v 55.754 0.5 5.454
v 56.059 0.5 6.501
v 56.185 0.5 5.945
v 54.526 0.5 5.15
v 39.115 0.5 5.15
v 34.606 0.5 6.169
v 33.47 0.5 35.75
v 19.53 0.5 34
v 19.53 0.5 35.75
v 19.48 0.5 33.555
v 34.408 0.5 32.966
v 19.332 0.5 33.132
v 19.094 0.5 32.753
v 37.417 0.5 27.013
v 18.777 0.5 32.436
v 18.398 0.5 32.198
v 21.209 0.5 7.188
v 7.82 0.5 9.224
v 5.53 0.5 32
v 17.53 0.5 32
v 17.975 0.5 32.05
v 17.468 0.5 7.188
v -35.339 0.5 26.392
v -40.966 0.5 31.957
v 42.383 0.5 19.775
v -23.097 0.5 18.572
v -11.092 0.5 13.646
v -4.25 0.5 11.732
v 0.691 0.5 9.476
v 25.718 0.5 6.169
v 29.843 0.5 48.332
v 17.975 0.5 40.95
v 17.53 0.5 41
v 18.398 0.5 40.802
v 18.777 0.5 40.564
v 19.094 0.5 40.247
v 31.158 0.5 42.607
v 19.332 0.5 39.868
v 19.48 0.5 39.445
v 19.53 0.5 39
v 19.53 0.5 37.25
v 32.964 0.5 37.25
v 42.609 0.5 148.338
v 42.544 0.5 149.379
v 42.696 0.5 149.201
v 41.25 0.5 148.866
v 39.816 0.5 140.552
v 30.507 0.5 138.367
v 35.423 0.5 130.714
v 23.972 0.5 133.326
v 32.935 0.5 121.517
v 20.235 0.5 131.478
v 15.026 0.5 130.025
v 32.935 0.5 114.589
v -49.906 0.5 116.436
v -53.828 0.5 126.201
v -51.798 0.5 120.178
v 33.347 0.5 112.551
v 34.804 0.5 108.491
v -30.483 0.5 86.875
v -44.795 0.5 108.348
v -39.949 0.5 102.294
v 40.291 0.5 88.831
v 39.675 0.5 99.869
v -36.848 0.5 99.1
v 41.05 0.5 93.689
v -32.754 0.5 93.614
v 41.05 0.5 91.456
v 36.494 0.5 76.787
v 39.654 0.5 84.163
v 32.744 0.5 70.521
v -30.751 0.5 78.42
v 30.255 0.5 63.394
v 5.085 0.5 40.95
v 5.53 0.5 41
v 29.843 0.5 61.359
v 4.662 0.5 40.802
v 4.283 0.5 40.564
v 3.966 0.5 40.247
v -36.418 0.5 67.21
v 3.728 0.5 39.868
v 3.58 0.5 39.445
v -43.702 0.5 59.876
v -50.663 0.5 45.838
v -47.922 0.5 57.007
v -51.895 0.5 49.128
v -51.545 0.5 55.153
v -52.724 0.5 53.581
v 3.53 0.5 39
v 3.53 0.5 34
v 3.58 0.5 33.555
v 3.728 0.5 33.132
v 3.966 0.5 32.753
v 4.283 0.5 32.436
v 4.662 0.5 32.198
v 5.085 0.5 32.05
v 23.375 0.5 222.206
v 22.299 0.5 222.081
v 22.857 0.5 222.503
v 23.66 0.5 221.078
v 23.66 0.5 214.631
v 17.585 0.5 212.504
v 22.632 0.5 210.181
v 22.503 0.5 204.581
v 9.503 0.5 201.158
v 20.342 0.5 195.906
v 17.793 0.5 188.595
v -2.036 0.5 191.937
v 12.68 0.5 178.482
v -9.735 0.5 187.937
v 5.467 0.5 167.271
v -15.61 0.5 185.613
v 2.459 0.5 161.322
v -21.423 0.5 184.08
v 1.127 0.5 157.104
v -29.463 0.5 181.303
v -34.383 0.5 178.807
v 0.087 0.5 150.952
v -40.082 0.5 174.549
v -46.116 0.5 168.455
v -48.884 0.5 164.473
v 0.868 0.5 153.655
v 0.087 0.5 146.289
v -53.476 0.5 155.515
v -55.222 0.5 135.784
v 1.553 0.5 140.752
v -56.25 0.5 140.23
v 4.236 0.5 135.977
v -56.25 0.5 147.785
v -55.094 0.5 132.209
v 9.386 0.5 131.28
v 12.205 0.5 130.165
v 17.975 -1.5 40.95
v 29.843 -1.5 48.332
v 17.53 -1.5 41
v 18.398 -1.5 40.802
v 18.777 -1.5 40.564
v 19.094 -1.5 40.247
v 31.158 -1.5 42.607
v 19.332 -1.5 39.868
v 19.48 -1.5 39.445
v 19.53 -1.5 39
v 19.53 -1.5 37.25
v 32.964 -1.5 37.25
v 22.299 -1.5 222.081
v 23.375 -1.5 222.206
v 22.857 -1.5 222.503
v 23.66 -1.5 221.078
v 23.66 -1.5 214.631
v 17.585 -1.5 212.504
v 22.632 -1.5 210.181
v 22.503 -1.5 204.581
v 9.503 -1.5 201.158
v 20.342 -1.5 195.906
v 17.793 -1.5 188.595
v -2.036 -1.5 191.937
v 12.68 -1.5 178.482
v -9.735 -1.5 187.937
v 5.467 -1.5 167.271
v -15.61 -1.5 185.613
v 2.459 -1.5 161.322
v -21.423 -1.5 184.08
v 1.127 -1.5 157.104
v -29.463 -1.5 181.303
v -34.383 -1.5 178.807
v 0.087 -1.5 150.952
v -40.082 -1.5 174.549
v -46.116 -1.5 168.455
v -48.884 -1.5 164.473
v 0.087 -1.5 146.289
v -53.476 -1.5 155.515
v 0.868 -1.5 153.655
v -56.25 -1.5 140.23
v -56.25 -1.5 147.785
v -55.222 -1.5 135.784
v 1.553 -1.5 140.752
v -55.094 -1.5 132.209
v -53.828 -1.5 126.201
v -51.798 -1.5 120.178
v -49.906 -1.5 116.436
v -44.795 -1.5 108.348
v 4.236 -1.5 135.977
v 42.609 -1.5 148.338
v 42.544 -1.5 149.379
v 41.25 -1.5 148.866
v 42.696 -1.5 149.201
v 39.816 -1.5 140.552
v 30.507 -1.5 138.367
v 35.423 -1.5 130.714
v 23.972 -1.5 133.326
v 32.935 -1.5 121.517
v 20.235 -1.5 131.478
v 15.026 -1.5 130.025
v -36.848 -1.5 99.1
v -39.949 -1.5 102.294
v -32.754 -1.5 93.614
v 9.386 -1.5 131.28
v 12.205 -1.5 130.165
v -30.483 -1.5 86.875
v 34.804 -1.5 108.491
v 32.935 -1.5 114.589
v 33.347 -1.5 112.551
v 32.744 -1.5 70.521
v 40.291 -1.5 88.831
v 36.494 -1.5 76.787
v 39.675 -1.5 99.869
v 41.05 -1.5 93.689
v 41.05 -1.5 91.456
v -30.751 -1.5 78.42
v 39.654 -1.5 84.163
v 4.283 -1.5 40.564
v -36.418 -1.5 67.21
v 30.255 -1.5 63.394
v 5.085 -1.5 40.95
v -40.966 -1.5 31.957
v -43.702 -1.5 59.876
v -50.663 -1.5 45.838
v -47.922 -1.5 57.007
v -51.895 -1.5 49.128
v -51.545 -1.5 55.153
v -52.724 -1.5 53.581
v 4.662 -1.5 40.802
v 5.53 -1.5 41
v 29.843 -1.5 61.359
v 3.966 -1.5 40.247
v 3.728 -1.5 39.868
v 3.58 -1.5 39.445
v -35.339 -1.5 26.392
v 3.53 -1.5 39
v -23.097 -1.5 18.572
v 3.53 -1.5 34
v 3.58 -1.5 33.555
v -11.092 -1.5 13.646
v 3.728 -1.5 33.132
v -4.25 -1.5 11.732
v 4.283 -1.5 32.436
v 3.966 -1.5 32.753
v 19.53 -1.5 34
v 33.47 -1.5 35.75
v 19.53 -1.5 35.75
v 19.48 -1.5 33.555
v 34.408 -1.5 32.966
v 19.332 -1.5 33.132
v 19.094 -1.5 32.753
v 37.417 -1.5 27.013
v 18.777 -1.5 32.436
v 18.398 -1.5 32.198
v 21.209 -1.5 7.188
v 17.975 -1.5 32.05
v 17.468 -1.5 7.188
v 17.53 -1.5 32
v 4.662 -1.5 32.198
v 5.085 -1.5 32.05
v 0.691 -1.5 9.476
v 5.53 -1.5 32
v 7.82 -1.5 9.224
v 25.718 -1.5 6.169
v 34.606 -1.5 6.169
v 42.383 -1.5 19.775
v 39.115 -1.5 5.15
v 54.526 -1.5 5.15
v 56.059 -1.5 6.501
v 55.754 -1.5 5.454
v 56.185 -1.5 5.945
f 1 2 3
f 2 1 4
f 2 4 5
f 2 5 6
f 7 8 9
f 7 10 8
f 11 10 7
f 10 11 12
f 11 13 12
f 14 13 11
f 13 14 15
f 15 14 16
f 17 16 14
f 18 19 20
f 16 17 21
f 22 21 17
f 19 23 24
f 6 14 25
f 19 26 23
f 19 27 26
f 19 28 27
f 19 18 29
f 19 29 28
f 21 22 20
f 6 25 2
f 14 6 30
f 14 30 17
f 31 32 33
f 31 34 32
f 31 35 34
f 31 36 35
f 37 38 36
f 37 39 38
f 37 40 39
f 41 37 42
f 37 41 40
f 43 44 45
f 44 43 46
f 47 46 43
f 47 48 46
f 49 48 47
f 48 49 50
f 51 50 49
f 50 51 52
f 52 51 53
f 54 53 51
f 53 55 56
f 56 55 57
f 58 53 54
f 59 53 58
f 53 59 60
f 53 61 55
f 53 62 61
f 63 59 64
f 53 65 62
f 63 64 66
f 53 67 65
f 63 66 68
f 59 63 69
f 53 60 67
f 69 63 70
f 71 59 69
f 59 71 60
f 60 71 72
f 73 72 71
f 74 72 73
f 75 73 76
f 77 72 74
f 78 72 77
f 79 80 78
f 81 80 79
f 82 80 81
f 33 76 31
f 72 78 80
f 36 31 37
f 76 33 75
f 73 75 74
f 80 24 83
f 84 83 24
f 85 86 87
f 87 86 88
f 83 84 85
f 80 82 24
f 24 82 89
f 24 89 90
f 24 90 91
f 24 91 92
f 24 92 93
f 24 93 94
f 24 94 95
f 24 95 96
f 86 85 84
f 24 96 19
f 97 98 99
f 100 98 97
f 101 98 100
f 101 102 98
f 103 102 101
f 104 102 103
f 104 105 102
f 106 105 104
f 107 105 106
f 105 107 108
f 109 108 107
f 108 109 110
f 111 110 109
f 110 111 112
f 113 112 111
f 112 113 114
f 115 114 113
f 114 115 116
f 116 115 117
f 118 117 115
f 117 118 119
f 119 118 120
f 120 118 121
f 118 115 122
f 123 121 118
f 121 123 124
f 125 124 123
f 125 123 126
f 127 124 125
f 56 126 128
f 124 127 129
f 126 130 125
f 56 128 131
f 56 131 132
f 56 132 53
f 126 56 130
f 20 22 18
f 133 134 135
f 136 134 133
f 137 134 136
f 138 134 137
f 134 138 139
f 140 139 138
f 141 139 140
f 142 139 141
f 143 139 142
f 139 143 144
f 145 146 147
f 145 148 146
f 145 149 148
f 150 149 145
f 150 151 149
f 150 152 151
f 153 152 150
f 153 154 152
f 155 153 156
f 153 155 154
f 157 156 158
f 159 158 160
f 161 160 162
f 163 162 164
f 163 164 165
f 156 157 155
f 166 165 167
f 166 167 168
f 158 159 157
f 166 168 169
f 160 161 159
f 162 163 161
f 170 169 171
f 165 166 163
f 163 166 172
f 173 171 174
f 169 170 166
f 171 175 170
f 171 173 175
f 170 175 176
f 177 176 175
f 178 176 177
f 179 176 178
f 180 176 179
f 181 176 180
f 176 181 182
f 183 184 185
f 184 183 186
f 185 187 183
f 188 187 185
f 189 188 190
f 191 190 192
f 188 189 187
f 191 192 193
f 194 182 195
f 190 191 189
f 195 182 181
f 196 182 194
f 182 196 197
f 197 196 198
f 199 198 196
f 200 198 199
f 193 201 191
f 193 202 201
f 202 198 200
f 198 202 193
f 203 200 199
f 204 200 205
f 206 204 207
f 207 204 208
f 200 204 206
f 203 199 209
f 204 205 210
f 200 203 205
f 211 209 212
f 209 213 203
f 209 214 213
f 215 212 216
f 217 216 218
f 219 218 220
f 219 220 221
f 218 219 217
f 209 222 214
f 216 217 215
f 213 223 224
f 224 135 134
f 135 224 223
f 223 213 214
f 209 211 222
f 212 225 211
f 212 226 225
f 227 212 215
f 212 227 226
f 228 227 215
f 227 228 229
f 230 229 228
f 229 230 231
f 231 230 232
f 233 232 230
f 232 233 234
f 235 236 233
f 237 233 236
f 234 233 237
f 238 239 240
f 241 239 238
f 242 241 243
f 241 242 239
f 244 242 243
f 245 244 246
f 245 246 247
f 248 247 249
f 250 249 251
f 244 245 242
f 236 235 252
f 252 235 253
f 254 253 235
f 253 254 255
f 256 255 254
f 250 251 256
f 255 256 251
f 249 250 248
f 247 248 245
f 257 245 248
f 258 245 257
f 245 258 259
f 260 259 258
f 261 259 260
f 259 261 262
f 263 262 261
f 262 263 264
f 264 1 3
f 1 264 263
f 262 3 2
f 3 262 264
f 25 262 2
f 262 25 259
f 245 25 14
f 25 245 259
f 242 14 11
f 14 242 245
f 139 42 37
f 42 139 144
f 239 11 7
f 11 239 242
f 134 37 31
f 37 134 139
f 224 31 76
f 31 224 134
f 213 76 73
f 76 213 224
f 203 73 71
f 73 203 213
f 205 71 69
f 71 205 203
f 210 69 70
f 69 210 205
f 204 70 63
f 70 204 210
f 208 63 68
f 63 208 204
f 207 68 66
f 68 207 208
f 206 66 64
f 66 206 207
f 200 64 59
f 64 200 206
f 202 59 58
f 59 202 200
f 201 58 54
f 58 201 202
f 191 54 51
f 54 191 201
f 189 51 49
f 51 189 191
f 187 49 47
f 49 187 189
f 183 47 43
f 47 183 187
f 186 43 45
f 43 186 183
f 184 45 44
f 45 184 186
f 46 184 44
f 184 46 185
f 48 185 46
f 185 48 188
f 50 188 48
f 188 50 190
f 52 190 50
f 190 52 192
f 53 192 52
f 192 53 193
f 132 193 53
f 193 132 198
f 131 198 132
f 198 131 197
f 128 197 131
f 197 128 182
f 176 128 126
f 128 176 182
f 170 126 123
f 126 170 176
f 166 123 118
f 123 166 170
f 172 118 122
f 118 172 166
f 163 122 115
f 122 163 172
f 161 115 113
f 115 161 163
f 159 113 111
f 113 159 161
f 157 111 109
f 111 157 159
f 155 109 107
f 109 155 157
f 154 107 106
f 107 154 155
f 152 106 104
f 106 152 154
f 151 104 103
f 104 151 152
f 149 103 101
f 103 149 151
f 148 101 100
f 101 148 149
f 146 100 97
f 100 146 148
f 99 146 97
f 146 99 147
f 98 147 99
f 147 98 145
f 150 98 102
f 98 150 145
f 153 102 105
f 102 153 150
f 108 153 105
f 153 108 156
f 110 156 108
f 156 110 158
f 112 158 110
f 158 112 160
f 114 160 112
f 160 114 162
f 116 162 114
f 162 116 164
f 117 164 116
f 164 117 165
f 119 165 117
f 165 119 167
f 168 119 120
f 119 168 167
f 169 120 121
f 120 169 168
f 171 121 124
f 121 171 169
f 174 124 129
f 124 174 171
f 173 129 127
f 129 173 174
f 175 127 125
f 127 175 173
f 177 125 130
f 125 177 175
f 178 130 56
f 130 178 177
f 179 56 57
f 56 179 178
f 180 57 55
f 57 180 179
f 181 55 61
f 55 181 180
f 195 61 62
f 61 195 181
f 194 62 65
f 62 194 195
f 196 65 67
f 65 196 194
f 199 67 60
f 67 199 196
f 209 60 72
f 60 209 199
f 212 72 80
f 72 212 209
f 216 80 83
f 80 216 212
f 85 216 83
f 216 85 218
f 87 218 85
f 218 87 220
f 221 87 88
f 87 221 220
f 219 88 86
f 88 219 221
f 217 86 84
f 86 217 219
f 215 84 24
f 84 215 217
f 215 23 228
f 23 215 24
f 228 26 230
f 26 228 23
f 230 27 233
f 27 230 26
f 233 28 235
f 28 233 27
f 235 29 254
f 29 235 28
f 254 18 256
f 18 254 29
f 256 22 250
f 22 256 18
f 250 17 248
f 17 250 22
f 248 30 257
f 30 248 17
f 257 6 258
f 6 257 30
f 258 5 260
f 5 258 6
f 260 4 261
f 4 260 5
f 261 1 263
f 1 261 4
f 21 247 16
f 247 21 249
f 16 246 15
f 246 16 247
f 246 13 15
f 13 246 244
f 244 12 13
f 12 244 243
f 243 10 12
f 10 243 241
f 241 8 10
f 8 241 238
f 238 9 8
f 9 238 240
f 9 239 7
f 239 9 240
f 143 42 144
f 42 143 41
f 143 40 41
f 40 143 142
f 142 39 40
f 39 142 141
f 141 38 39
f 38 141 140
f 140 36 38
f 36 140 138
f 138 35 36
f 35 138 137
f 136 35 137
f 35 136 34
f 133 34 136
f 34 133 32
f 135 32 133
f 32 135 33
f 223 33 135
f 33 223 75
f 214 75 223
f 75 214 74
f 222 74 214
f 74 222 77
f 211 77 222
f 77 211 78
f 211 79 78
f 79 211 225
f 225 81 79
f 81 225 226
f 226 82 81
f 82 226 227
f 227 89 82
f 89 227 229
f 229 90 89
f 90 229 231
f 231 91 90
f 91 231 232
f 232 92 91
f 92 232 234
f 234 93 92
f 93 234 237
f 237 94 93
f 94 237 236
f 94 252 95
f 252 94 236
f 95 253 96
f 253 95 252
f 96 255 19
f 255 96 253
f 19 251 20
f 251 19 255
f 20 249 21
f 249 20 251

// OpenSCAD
// file: shape_pts.scad
// Left Flame (FL) traced from images/generate_an_image_of_this.png via octolamp-lamp-base.
// Exterior housing: 120.00 x 225.00 mm (114.00 x 219.00 mm interior cavity + 3.00 mm Octolamp wall).
// Matches the 1.5x flame-to-letter height proportion next to the 100 x 150 mm Engenesis letters.

shape_w = 114.00;
shape_h = 219.00;
rec_chip_x = 12.00;
rec_chip_z = 62.00;
rec_cable_x = 12.00;
rec_ziptie_z = 33.50;
rec_keyhole_z = 19.50;
rec_slit_dir = 1;
rec_snap_top_x = 14.50;
rec_snap_top_z = 126.40;
rec_snap_bot_x = 42.00;
rec_clip_x = 38.00;
rec_pillars = [[-18.0, 88.0], [-12.0, 44.0], [-26.0, 128.0], [-12.0, 164.0]];

shape_pts = [[56.742,2.484],[42.959,15.861],[38.064,22.996],[35.102,28.856],[31.881,38.411],[30.593,44.017],[30.593,56.884],[30.980,58.795],[33.427,65.802],[37.163,72.045],[40.383,79.561],[41.027,84.275],[41.800,86.950],[41.800,89.371],[40.383,95.741],[35.488,104.404],[34.071,108.353],[33.685,110.264],[33.685,117.017],[36.132,126.062],[40.512,135.872],[43.346,143.771],[43.475,145.045],[42.766,145.873],[40.834,145.108],[30.014,134.534],[23.573,129.565],[19.966,127.782],[14.942,126.380],[12.366,126.508],[9.790,127.527],[4.831,132.050],[2.254,136.636],[0.837,141.987],[0.837,146.446],[1.610,149.121],[1.868,152.561],[3.156,156.638],[6.119,162.498],[13.332,173.709],[18.485,183.901],[21.061,191.291],[23.251,200.081],[23.380,205.687],[24.410,210.146],[24.410,216.771],[24.024,218.299],[22.800,219.000],[21.705,218.172],[16.939,208.490],[8.953,197.278],[-2.447,188.169],[-10.047,184.220],[-15.844,181.927],[-21.641,180.398],[-29.756,177.595],[-34.780,175.047],[-40.576,170.716],[-46.695,164.537],[-49.529,160.460],[-54.166,151.414],[-57.000,143.516],[-57.000,135.744],[-55.969,131.285],[-55.841,127.718],[-54.553,121.603],[-52.492,115.488],[-50.559,111.666],[-45.407,103.512],[-40.512,97.397],[-37.420,94.212],[-33.427,88.861],[-31.237,82.364],[-31.495,74.210],[-37.034,63.254],[-44.183,56.056],[-48.305,53.253],[-52.041,51.342],[-53.522,49.367],[-52.620,44.526],[-51.332,41.086],[-41.542,27.072],[-35.810,21.403],[-23.444,13.504],[-11.336,8.536],[-4.508,6.625],[0.515,4.332],[7.729,4.077],[17.390,2.038],[21.125,2.038],[25.634,1.019],[34.522,1.019],[39.031,0.000],[54.617,0.000],[56.163,0.382],[57.000,1.338]];
shape_paths = [[0, 1, 2, 3, 4, 5, 6, 7, 8, 9, 10, 11, 12, 13, 14, 15, 16, 17, 18, 19, 20, 21, 22, 23, 24, 25, 26, 27, 28, 29, 30, 31, 32, 33, 34, 35, 36, 37, 38, 39, 40, 41, 42, 43, 44, 45, 46, 47, 48, 49, 50, 51, 52, 53, 54, 55, 56, 57, 58, 59, 60, 61, 62, 63, 64, 65, 66, 67, 68, 69, 70, 71, 72, 73, 74, 75, 76, 77, 78, 79, 80, 81, 82, 83, 84, 85, 86, 87, 88, 89, 90, 91, 92, 93, 94, 95]];

diffuser_shape_pts = [[56.742,2.484],[42.959,15.861],[38.064,22.996],[35.102,28.856],[31.881,38.411],[30.593,44.017],[30.593,56.884],[30.980,58.795],[33.427,65.802],[37.163,72.045],[40.383,79.561],[41.027,84.275],[41.800,86.950],[41.800,89.371],[40.383,95.741],[35.488,104.404],[34.071,108.353],[33.685,110.264],[33.685,117.017],[36.132,126.062],[40.512,135.872],[43.346,143.771],[43.475,145.045],[42.766,145.873],[40.834,145.108],[30.014,134.534],[23.573,129.565],[19.966,127.782],[14.942,126.380],[12.366,126.508],[9.790,127.527],[4.831,132.050],[2.254,136.636],[0.837,141.987],[0.837,146.446],[1.610,149.121],[1.868,152.561],[3.156,156.638],[6.119,162.498],[13.332,173.709],[18.485,183.901],[21.061,191.291],[23.251,200.081],[23.380,205.687],[24.410,210.146],[24.410,216.771],[24.024,218.299],[22.800,219.000],[21.705,218.172],[16.939,208.490],[8.953,197.278],[-2.447,188.169],[-10.047,184.220],[-15.844,181.927],[-21.641,180.398],[-29.756,177.595],[-34.780,175.047],[-40.576,170.716],[-46.695,164.537],[-49.529,160.460],[-54.166,151.414],[-57.000,143.516],[-57.000,135.744],[-55.969,131.285],[-55.841,127.718],[-54.553,121.603],[-52.492,115.488],[-50.559,111.666],[-45.407,103.512],[-40.512,97.397],[-37.420,94.212],[-33.427,88.861],[-31.237,82.364],[-31.495,74.210],[-37.034,63.254],[-44.183,56.056],[-48.305,53.253],[-52.041,51.342],[-53.522,49.367],[-52.620,44.526],[-51.332,41.086],[-41.542,27.072],[-35.810,21.403],[-23.444,13.504],[-11.336,8.536],[-4.508,6.625],[0.515,4.332],[7.729,4.077],[17.390,2.038],[21.125,2.038],[25.634,1.019],[34.522,1.019],[39.031,0.000],[54.617,0.000],[56.163,0.382],[57.000,1.338]];
diffuser_shape_paths = [[0, 1, 2, 3, 4, 5, 6, 7, 8, 9, 10, 11, 12, 13, 14, 15, 16, 17, 18, 19, 20, 21, 22, 23, 24, 25, 26, 27, 28, 29, 30, 31, 32, 33, 34, 35, 36, 37, 38, 39, 40, 41, 42, 43, 44, 45, 46, 47, 48, 49, 50, 51, 52, 53, 54, 55, 56, 57, 58, 59, 60, 61, 62, 63, 64, 65, 66, 67, 68, 69, 70, 71, 72, 73, 74, 75, 76, 77, 78, 79, 80, 81, 82, 83, 84, 85, 86, 87, 88, 89, 90, 91, 92, 93, 94, 95]];

module shape_2d(pts = shape_pts) {
    polygon(points = pts, paths = shape_paths);
}

module diffuser_shape_2d(pts = diffuser_shape_pts) {
    polygon(points = pts, paths = diffuser_shape_paths);
}
// main file
// Left Flame ("FL") internal white reflector plate (2.00 mm thick, 16 x 9 mm cable pocket + 1.50 mm side-entry wire slit).
// Opens and exports standalone in OpenSCAD / OpenSCAD.js.

use <lamp_core.scad>

render_lamp_part("reflector");
